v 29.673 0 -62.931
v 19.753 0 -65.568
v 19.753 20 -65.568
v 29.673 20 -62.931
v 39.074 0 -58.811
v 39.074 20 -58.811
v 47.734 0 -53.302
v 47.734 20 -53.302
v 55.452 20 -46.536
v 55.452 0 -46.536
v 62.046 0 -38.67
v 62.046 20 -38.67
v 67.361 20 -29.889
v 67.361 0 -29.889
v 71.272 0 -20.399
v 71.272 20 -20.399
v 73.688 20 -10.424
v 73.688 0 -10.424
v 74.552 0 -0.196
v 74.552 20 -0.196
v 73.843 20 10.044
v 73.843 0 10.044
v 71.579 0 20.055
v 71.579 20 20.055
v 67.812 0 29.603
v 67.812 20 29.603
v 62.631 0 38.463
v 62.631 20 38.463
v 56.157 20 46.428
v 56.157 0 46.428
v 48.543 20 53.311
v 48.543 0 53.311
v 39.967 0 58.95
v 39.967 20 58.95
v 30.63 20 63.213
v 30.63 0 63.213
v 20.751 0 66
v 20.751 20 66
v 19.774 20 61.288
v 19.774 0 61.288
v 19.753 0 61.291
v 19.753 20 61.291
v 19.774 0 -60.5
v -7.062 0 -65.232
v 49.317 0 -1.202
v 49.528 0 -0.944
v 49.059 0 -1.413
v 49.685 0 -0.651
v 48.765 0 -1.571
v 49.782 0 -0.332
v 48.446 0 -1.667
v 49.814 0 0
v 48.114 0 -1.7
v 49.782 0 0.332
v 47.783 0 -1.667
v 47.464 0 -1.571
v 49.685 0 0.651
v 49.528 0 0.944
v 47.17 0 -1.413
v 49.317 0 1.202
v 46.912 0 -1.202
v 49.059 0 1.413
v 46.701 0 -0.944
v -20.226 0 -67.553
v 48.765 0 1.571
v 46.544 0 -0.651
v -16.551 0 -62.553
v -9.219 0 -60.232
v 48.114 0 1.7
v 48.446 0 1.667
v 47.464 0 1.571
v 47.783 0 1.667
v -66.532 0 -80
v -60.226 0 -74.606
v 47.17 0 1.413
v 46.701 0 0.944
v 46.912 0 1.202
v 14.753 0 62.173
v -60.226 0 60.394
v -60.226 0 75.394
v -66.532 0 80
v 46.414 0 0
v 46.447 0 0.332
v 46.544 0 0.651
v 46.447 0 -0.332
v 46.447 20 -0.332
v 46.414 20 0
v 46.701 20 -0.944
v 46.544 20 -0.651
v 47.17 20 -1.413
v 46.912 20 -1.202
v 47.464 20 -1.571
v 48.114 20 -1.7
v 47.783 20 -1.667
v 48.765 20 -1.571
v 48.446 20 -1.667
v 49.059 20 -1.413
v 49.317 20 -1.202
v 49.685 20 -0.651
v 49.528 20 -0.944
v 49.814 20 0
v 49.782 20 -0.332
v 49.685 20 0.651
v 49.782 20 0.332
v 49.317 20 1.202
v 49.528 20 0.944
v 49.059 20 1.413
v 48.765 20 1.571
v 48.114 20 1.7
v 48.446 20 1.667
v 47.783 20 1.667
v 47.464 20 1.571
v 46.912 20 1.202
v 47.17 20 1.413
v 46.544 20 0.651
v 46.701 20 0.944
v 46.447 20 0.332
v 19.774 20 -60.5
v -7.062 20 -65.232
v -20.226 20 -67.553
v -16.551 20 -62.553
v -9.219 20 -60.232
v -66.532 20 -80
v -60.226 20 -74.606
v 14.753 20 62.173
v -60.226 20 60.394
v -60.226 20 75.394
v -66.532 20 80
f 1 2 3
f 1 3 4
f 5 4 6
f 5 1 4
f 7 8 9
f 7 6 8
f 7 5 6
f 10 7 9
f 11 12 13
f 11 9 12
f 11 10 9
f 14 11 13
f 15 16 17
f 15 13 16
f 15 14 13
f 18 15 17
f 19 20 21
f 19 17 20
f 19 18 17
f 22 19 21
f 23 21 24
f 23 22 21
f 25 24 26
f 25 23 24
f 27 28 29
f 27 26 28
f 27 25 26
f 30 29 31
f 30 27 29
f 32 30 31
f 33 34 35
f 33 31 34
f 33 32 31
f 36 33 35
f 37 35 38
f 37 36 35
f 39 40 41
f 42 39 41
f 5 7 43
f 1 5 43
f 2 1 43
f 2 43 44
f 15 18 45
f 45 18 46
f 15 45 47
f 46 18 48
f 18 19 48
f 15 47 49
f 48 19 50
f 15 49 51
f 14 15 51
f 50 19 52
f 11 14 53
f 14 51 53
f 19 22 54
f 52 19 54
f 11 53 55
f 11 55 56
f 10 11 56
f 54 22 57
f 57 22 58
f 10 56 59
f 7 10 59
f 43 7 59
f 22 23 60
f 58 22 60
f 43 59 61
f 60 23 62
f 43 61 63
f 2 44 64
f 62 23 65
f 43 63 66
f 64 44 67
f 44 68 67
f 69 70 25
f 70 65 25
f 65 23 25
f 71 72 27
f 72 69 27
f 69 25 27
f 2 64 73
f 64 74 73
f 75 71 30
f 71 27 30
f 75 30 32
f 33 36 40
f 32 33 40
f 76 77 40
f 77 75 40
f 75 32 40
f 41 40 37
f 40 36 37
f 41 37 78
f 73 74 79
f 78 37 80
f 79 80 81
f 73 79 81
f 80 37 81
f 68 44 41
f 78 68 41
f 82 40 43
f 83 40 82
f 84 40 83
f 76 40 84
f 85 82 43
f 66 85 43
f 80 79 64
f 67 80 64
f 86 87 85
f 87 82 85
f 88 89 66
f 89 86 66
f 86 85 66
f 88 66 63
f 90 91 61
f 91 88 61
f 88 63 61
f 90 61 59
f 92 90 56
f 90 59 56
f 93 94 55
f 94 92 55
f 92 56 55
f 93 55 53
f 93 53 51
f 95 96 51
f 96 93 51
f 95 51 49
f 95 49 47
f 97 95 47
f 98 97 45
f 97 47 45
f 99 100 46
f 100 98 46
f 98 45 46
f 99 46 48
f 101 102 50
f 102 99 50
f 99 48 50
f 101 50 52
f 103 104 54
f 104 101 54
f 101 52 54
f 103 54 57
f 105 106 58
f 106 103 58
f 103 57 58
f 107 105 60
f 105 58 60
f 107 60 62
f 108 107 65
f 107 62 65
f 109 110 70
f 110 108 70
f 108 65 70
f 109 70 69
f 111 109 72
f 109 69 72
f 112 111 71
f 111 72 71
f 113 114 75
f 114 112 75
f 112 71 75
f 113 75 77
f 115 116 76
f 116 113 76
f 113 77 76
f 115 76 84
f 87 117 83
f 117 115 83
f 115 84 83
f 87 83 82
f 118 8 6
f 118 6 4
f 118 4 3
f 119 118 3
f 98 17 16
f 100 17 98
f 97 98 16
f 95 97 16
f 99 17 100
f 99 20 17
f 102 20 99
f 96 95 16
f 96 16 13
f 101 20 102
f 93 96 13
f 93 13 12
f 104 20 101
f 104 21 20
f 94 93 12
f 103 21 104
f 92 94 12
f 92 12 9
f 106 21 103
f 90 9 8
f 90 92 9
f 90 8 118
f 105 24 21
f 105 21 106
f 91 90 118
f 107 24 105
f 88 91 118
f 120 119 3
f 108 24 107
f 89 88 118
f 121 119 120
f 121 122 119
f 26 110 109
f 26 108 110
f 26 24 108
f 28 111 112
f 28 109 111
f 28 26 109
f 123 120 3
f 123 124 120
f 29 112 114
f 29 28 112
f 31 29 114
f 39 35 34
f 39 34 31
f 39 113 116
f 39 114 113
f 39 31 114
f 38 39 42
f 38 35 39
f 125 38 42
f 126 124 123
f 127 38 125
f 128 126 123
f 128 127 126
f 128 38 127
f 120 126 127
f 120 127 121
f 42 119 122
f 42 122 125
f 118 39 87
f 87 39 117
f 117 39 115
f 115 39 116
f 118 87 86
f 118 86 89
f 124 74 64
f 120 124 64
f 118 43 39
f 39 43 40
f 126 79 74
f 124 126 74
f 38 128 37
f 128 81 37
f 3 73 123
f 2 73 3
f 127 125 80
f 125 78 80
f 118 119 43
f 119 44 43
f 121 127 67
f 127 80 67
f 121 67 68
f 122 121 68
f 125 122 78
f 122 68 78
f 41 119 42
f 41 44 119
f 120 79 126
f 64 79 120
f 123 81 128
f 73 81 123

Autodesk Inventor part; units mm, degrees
ref_plane "YZ Plane" through (0, 0, 0) normal (1, 0, 0) x (0, 1, 0)
ref_plane "XZ Plane" through (0, 0, 0) normal (0, 1, 0) x (-1, 0, 0)
ref_plane "XY Plane" through (0, 0, 0) normal (0, 0, 1) x (1, 0, 0)
sketch "Skizze1" plane through (0, 0, 0) normal (0, 1, 0) x (-1, 0, 0)
  line L0 (60.2262, 75.3938) -> (60.2262, -74.6062)
  line L1 (60.2262, -74.6062) -> (-19.7738, -60.5)
  line L2 (-19.7738, -60.5) -> (-19.7738, 61.2877)
  line L3 (-19.7738, 61.2877) -> (60.2262, 75.3938)
  arc A0 (-19.7738, 61.2877) -> (-19.7738, -60.5) centre (-8.1145, 0.3938) ccw
  circle A1 centre (-48.1145, 0) radius 1.7
  line L4 (60.2262, 60.3938) -> (20.2262, -67.5531)
  line L5 (7.0615, -65.2318) -> (-19.7534, 61.2913)
  line L6 (60.2262, 75.3938) -> (16.5507, -62.5531)
  line L7 (16.5507, -62.5531) -> (9.219, -60.2318)
  line L8 (9.219, -60.2318) -> (-14.7534, 62.1729)
  line L9 (66.5322, 80) -> (66.5322, -80)
  line L10 (66.5322, -80) -> (-19.7534, -65.5678)
  line L11 (66.5322, 80) -> (-20.7513, 65.9995)
  arc A2 (-20.7513, 65.9995) -> (-19.7534, -65.5678) centre (-7.5537, 0.3121) ccw
  point P0 (0, 0)
  point P1 (0, 0)
  dimension "d6" = 150
  dimension "d8" = 80
  dimension "d9" = 100
  dimension "d10" = 100
  dimension "d12" = 60.5
  dimension "d15" = 62
  dimension "d16" = 3.4
  dimension "d17" = 40
  dimension "d18" = 15
  dimension "d22" = 5
  dimension "d23" = 5
  dimension "d25" = 5
  dimension "d26" = 5
  dimension "d27" = 3.1473
  dimension "d28" = 7.3316
  dimension "d29" = 160
  dimension "d30" = 80
  dimension "d31" = 67
extrude "Extrusion1" add sketch "Skizze1" along normal blind 20 contours L0 L4 L1 L5 L3 L8 L7 L6 | L2 A0 | L9 L10 A2 L11
properties part number "Radaufhängung"
